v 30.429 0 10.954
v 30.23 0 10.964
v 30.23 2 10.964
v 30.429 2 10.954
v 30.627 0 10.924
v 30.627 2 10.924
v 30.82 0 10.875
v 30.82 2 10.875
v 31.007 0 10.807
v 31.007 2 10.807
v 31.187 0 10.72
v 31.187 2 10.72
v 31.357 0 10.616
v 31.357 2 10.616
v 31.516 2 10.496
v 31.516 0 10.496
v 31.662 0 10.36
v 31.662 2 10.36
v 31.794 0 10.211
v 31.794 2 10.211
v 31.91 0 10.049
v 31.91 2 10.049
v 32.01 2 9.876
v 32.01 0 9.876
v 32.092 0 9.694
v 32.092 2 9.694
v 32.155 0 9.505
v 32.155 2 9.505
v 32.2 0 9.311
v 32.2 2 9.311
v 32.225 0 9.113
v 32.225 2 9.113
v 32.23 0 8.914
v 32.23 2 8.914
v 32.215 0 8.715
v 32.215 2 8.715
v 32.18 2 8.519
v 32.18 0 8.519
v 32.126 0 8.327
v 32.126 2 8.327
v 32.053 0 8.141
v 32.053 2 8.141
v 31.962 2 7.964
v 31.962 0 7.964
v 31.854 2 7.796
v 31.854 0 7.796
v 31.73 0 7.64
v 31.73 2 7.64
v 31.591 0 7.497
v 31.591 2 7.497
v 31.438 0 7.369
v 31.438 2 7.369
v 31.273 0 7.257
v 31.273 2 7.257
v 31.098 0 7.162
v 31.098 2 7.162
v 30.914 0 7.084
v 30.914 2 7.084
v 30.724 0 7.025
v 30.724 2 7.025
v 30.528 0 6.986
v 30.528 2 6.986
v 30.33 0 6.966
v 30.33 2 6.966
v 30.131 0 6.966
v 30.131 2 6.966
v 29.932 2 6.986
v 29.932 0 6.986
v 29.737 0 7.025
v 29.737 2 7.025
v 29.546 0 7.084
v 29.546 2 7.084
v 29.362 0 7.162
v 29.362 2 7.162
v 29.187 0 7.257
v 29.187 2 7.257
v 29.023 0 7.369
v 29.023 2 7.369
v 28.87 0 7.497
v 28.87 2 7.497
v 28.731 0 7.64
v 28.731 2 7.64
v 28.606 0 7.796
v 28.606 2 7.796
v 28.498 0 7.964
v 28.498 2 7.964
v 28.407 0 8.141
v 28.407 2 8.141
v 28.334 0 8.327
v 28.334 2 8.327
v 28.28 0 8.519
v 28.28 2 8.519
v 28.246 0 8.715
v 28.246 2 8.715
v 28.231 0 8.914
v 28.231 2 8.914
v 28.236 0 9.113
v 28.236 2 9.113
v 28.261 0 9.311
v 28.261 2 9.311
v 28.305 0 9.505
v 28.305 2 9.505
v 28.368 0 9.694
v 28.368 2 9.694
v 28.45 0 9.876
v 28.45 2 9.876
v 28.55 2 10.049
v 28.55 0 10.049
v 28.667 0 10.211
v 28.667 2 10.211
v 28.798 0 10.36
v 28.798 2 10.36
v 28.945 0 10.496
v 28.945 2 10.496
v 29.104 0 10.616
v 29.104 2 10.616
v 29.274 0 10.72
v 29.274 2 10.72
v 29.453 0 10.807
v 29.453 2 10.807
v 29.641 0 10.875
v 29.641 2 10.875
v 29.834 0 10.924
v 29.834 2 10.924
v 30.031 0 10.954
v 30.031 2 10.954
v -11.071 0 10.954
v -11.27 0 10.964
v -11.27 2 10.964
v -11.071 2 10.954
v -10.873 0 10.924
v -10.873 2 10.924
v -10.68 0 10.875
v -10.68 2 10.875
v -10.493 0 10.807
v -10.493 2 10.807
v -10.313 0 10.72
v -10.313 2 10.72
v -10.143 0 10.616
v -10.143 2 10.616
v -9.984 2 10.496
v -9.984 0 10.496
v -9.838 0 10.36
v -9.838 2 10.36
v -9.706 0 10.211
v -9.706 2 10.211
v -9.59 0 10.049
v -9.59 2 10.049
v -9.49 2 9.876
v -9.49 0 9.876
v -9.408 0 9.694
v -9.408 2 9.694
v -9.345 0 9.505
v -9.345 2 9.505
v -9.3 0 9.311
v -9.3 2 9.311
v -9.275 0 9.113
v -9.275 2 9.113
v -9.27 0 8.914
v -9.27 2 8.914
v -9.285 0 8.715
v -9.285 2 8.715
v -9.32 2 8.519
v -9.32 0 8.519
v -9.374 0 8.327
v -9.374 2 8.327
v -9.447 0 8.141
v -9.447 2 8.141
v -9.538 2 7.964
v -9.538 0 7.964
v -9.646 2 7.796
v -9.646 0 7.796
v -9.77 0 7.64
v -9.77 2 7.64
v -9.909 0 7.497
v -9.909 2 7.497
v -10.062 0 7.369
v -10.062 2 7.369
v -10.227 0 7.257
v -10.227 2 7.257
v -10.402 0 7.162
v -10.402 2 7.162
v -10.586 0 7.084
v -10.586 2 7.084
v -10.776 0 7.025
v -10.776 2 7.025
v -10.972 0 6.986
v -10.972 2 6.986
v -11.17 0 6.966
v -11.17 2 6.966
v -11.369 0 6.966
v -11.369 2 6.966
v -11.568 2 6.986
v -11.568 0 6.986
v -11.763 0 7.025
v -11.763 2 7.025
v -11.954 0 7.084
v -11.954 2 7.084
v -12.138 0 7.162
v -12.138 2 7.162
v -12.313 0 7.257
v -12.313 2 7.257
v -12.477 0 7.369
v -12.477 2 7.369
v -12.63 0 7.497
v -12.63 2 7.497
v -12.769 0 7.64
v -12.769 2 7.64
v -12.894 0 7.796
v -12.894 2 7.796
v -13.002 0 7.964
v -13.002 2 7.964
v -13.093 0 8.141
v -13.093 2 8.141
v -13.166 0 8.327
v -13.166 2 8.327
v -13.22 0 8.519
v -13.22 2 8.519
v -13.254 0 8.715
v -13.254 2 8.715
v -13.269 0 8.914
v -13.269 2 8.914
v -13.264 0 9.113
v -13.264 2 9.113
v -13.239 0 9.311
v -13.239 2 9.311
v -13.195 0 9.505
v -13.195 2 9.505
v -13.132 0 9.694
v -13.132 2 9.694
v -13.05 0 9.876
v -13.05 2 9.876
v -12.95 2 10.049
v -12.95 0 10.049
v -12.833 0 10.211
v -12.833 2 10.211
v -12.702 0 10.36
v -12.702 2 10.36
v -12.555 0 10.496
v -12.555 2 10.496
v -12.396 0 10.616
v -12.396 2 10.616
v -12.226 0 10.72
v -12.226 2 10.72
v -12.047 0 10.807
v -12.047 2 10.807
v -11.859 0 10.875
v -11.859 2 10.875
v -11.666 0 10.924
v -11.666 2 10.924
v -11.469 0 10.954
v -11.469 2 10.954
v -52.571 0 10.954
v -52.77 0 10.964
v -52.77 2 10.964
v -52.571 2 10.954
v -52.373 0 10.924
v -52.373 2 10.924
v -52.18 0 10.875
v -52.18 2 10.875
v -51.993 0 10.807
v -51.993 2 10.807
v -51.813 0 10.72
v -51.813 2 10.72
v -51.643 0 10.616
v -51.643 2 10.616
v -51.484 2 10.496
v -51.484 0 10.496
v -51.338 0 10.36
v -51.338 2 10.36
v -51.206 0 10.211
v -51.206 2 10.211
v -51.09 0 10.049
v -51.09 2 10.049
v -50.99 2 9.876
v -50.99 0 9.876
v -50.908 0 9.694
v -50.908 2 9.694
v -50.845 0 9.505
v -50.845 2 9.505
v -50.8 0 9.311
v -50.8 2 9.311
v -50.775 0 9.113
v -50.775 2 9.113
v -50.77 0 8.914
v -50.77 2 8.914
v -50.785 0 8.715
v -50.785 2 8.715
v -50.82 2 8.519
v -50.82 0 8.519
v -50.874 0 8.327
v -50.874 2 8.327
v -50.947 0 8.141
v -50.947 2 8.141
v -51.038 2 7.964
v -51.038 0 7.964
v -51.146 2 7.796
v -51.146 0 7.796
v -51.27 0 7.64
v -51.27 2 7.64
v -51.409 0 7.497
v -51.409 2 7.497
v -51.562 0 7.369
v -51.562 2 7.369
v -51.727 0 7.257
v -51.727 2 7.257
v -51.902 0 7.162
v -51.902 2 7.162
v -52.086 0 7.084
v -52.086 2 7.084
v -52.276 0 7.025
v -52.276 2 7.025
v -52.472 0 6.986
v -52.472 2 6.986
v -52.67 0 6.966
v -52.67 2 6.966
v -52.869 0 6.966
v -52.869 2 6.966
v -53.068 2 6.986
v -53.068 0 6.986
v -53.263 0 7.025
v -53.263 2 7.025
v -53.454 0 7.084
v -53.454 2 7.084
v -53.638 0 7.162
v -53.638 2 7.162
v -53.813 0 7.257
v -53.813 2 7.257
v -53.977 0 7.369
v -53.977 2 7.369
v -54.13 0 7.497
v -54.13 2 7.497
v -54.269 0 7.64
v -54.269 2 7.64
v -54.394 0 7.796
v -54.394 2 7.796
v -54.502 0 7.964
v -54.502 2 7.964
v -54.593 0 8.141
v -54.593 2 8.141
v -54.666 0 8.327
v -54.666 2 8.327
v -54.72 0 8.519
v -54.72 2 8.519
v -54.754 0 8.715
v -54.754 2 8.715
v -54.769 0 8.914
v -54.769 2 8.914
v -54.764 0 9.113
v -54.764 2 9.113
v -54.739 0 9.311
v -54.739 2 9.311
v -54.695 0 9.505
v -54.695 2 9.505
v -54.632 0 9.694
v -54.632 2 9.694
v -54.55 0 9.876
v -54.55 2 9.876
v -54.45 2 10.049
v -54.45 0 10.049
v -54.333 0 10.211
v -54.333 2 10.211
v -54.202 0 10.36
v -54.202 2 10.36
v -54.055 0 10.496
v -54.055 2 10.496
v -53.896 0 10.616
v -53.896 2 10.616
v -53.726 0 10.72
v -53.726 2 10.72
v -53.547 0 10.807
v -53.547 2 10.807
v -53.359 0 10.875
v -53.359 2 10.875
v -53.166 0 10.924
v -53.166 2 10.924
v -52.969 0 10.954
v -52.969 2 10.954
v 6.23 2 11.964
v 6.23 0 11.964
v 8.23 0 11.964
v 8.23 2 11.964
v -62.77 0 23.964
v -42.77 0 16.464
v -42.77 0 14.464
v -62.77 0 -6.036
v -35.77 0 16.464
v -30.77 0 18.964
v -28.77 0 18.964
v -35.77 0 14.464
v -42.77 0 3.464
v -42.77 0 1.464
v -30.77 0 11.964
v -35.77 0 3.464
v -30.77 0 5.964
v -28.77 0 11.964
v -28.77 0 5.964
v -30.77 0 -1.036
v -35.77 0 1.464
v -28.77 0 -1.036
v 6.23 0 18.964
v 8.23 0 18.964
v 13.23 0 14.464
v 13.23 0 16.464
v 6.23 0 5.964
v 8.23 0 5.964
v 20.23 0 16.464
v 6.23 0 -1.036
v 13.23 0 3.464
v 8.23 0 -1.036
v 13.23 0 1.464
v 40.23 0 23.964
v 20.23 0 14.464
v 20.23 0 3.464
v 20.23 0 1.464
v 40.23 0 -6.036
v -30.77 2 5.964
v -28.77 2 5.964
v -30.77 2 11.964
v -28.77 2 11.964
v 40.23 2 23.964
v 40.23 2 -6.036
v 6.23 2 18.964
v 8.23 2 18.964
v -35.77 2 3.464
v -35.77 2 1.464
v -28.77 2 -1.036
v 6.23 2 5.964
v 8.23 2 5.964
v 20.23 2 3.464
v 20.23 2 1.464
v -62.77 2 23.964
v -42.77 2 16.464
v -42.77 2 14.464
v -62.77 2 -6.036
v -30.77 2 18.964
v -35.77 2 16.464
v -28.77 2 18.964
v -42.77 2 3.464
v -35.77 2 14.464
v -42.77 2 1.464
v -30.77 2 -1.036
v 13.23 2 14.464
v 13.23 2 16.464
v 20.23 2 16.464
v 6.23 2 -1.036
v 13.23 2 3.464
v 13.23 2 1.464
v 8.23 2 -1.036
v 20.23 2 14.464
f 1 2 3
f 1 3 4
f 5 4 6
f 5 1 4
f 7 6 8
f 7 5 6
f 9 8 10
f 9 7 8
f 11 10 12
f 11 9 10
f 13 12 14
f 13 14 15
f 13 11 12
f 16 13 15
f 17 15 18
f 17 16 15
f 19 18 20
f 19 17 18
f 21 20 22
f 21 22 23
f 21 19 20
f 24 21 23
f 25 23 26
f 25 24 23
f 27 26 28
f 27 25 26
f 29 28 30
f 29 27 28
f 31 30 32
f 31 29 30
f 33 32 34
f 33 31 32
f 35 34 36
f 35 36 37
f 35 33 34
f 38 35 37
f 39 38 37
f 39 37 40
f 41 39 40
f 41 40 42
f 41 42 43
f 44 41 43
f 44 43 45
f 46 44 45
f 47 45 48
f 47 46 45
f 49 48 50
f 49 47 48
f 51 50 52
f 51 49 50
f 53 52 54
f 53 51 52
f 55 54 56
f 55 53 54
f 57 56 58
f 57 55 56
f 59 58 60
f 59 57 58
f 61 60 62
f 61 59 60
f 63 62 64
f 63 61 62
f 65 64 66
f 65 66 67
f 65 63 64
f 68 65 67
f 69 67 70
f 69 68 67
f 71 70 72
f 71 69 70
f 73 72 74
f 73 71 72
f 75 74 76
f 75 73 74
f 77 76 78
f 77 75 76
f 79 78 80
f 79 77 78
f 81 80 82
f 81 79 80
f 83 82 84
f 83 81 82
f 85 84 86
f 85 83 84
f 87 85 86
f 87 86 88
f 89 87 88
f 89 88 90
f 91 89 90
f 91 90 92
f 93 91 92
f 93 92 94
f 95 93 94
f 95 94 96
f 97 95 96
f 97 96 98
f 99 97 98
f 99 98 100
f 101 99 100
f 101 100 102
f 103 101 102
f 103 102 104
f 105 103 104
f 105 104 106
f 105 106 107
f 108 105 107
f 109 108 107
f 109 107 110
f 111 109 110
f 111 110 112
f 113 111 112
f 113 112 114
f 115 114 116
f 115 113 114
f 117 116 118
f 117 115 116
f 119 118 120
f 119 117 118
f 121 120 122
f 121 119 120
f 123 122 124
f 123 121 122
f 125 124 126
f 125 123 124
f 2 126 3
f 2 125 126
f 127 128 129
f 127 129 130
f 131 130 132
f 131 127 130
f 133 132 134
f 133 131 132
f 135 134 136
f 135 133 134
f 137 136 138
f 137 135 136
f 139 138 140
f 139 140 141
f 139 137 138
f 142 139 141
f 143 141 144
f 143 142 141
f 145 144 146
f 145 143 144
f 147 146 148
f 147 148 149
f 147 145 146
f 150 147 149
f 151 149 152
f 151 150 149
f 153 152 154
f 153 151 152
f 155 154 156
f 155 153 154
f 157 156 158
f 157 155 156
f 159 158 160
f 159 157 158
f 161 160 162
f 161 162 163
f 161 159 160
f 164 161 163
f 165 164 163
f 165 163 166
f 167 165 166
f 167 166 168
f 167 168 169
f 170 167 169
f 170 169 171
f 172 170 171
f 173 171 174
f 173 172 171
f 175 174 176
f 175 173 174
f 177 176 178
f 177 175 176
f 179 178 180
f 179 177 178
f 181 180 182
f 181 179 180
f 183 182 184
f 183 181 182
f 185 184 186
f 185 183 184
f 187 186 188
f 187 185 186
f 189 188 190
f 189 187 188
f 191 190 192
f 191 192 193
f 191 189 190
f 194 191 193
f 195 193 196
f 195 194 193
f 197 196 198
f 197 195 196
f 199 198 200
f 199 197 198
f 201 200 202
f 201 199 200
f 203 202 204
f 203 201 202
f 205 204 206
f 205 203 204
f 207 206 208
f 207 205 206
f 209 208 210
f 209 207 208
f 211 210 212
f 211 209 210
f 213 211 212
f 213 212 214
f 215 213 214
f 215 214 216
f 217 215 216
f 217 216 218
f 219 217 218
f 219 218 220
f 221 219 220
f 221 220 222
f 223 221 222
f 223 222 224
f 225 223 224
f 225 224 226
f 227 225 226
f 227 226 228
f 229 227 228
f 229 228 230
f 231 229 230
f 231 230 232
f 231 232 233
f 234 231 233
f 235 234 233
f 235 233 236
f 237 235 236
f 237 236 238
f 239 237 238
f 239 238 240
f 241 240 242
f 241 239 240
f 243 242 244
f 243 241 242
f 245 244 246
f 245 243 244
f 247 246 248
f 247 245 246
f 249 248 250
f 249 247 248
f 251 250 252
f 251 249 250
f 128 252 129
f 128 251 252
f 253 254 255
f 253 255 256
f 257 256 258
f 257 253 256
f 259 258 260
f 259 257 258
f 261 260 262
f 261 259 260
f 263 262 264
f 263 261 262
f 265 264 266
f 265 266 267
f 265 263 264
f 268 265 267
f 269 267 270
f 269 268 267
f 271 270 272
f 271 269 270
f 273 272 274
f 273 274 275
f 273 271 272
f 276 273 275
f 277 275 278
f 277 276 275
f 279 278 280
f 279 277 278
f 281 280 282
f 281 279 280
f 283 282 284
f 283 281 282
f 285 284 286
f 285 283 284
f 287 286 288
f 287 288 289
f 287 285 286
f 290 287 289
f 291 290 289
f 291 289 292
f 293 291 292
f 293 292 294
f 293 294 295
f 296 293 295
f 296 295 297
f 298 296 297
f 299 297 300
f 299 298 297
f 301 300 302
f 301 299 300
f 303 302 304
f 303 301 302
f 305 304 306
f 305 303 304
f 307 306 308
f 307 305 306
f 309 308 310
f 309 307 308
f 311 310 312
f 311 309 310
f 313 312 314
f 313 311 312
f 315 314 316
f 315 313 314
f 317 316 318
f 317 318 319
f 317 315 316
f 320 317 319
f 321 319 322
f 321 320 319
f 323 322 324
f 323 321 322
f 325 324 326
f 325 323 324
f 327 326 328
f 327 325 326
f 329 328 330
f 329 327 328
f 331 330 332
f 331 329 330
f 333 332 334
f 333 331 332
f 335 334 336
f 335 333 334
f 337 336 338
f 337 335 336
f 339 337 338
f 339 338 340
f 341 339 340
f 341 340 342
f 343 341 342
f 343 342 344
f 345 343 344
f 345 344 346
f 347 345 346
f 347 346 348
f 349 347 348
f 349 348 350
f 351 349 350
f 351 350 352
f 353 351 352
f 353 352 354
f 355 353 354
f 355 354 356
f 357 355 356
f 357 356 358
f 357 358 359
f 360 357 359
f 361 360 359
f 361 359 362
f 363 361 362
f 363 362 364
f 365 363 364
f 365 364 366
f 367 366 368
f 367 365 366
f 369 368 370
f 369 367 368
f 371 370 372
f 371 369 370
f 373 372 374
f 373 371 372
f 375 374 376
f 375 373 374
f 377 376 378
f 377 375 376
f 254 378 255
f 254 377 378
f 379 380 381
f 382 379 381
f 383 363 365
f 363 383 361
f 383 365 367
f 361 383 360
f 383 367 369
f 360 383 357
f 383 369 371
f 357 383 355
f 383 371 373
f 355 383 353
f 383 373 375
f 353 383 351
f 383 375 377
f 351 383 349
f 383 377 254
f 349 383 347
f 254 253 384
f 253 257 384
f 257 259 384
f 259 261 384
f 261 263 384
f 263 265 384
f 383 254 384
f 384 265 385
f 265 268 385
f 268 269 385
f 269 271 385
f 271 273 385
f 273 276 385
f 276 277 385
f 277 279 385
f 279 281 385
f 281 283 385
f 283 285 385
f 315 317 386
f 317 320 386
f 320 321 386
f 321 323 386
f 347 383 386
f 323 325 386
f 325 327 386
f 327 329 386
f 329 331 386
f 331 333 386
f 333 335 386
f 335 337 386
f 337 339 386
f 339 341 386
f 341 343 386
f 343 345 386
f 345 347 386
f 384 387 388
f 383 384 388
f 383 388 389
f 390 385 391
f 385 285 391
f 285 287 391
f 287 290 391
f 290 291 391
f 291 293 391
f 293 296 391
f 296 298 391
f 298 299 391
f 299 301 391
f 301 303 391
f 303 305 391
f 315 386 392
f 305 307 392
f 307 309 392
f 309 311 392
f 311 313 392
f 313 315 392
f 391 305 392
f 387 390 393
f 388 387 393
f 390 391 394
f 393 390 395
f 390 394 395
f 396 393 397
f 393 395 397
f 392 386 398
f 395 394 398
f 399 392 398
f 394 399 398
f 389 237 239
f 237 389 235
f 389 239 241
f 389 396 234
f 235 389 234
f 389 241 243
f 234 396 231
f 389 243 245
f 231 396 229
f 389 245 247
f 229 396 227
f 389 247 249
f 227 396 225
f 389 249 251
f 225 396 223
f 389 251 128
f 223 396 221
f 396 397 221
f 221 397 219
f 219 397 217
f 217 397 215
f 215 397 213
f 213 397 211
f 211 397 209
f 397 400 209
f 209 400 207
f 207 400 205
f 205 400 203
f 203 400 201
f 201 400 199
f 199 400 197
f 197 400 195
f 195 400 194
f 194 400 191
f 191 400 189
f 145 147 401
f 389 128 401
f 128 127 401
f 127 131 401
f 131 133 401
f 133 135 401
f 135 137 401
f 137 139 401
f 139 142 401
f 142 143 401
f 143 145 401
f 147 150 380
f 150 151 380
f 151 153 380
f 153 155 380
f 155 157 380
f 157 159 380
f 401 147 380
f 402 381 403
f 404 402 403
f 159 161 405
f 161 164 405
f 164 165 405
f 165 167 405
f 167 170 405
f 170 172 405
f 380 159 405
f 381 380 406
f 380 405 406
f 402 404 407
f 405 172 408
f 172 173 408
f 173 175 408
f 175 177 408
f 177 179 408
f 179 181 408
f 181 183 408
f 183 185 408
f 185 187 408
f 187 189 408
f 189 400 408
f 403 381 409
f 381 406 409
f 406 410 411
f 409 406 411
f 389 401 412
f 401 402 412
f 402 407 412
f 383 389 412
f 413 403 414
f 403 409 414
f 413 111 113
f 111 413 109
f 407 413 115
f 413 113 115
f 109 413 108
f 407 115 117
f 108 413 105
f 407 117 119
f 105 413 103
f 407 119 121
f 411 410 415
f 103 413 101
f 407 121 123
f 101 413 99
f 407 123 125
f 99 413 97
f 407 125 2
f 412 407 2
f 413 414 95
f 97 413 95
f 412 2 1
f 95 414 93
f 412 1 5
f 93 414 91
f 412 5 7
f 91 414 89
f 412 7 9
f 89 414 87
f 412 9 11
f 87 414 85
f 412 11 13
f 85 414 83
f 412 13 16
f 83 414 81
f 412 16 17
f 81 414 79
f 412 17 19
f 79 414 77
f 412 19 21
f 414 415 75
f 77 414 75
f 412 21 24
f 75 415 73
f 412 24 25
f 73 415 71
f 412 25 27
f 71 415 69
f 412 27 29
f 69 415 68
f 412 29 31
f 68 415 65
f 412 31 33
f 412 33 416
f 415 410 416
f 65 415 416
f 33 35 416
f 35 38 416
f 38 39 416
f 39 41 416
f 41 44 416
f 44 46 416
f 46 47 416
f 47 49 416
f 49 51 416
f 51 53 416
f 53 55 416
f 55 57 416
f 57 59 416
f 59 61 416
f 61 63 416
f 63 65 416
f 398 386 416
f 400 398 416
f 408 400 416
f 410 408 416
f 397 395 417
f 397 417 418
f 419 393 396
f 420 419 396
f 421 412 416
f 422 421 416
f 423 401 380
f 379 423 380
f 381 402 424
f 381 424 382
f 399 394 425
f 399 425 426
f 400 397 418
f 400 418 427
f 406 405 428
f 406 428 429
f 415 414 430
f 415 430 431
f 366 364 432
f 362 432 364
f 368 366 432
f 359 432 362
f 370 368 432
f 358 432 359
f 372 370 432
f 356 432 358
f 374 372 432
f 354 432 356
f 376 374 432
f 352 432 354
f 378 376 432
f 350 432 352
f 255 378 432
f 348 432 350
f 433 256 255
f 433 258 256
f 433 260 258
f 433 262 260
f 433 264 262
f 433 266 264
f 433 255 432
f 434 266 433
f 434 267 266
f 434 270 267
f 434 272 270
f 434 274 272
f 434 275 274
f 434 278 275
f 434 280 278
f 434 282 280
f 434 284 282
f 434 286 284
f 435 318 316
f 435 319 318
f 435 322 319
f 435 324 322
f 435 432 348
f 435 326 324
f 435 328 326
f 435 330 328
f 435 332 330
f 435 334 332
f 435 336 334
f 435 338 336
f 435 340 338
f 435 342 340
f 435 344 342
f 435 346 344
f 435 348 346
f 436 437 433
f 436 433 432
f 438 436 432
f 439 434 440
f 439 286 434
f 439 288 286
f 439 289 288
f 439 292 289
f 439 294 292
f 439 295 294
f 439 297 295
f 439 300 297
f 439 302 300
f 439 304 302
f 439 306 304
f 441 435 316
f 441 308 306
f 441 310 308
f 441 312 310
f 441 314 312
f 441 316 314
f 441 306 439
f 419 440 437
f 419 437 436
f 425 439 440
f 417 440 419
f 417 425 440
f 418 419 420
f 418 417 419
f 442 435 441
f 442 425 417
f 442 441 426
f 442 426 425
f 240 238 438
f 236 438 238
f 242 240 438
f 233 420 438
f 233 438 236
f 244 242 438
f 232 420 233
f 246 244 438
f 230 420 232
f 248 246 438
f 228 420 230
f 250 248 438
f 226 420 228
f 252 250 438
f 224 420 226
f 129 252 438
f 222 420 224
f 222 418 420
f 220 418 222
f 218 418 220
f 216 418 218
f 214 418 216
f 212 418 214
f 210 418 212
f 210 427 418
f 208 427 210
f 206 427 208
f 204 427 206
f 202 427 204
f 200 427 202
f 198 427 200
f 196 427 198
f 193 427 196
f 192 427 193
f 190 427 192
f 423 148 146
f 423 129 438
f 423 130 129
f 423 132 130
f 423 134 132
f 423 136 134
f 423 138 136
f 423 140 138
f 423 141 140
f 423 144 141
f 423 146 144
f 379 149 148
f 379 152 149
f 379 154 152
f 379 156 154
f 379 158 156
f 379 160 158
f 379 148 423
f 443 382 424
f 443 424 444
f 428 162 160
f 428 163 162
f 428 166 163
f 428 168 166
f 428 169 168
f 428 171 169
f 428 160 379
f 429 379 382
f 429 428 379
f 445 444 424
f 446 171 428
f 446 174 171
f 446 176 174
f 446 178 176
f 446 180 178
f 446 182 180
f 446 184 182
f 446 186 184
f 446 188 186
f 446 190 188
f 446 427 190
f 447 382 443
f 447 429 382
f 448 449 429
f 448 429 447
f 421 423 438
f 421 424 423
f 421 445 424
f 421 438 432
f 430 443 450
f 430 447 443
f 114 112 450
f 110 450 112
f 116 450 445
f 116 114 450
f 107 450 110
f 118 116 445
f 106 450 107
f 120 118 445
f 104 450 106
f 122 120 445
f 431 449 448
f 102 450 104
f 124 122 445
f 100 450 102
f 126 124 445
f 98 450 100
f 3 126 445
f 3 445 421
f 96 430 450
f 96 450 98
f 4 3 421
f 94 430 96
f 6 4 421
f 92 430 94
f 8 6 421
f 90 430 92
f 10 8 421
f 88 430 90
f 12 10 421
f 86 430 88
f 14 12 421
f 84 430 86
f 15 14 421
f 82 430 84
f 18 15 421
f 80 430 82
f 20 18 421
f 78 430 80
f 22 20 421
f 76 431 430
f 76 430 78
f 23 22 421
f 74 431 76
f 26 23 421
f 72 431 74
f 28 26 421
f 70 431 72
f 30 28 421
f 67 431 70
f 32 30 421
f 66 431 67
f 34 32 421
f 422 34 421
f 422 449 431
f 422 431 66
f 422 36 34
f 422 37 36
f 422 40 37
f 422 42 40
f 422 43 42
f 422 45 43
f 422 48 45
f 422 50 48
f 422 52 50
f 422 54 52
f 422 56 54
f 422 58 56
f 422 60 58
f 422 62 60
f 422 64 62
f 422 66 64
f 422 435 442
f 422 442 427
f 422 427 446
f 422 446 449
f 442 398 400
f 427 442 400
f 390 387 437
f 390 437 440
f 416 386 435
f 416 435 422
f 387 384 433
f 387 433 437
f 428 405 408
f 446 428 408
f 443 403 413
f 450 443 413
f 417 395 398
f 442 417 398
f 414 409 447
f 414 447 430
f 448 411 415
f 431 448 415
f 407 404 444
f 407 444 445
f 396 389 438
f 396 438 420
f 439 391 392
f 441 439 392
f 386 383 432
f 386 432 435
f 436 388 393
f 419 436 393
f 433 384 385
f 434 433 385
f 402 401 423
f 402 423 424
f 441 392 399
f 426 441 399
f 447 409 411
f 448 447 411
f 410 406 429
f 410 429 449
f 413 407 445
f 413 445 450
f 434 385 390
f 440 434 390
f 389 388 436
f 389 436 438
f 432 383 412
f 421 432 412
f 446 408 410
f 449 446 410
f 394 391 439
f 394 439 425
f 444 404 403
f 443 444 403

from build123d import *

# Parameters (mm, degrees)
SKETCH1_W           = 103
SKETCH1_H           = 30
SKETCH1_R           = 2
SKETCH1_W_2         = 7
SKETCH1_H_2         = 2
SKETCH1_W_3         = 2
SKETCH1_H_3         = 7
BOSS_EXTRUDE1_DEPTH = 2


with BuildPart() as part:
    # Sketch1 → Boss-Extrude1 (new body)
    with BuildSketch(Plane(origin=(0, 0, 0), x_dir=(1, 0, 0), z_dir=(0, 1, 0))):
        with Locations((-11.269774173, -8.963557039)):
            Rectangle(SKETCH1_W, SKETCH1_H)
        with Locations(Location((-52.769774173, -8.963557039, 0), (0, 0, 270))):
            Circle(SKETCH1_R, mode=Mode.SUBTRACT)
        with Locations(Location((30.230225827, -8.963557039, 0), (0, 0, 270))):
            Circle(SKETCH1_R, mode=Mode.SUBTRACT)
        with Locations(Location((-11.269774173, -8.963557039, 0), (0, 0, 270))):
            Circle(SKETCH1_R, mode=Mode.SUBTRACT)
        with Locations((-39.269774173, -15.463557039)):
            Rectangle(SKETCH1_W_2, SKETCH1_H_2, mode=Mode.SUBTRACT)
        with Locations((-39.269774173, -2.463557039)):
            Rectangle(SKETCH1_W_2, SKETCH1_H_2, mode=Mode.SUBTRACT)
        with Locations((16.730225827, -2.463557039)):
            Rectangle(SKETCH1_W_2, SKETCH1_H_2, mode=Mode.SUBTRACT)
        with Locations((16.730225827, -15.463557039)):
            Rectangle(SKETCH1_W_2, SKETCH1_H_2, mode=Mode.SUBTRACT)
        with Locations((-29.769774173, -2.463557039)):
            Rectangle(SKETCH1_W_3, SKETCH1_H_3, mode=Mode.SUBTRACT)
        with Locations((-29.769774173, -15.463557039)):
            Rectangle(SKETCH1_W_3, SKETCH1_H_3, mode=Mode.SUBTRACT)
        with Locations((7.230225827, -15.463557039)):
            Rectangle(SKETCH1_W_3, SKETCH1_H_3, mode=Mode.SUBTRACT)
        with Locations((7.230225827, -2.463557039)):
            Rectangle(SKETCH1_W_3, SKETCH1_H_3, mode=Mode.SUBTRACT)
    extrude(amount=BOSS_EXTRUDE1_DEPTH)


solid = part.part
